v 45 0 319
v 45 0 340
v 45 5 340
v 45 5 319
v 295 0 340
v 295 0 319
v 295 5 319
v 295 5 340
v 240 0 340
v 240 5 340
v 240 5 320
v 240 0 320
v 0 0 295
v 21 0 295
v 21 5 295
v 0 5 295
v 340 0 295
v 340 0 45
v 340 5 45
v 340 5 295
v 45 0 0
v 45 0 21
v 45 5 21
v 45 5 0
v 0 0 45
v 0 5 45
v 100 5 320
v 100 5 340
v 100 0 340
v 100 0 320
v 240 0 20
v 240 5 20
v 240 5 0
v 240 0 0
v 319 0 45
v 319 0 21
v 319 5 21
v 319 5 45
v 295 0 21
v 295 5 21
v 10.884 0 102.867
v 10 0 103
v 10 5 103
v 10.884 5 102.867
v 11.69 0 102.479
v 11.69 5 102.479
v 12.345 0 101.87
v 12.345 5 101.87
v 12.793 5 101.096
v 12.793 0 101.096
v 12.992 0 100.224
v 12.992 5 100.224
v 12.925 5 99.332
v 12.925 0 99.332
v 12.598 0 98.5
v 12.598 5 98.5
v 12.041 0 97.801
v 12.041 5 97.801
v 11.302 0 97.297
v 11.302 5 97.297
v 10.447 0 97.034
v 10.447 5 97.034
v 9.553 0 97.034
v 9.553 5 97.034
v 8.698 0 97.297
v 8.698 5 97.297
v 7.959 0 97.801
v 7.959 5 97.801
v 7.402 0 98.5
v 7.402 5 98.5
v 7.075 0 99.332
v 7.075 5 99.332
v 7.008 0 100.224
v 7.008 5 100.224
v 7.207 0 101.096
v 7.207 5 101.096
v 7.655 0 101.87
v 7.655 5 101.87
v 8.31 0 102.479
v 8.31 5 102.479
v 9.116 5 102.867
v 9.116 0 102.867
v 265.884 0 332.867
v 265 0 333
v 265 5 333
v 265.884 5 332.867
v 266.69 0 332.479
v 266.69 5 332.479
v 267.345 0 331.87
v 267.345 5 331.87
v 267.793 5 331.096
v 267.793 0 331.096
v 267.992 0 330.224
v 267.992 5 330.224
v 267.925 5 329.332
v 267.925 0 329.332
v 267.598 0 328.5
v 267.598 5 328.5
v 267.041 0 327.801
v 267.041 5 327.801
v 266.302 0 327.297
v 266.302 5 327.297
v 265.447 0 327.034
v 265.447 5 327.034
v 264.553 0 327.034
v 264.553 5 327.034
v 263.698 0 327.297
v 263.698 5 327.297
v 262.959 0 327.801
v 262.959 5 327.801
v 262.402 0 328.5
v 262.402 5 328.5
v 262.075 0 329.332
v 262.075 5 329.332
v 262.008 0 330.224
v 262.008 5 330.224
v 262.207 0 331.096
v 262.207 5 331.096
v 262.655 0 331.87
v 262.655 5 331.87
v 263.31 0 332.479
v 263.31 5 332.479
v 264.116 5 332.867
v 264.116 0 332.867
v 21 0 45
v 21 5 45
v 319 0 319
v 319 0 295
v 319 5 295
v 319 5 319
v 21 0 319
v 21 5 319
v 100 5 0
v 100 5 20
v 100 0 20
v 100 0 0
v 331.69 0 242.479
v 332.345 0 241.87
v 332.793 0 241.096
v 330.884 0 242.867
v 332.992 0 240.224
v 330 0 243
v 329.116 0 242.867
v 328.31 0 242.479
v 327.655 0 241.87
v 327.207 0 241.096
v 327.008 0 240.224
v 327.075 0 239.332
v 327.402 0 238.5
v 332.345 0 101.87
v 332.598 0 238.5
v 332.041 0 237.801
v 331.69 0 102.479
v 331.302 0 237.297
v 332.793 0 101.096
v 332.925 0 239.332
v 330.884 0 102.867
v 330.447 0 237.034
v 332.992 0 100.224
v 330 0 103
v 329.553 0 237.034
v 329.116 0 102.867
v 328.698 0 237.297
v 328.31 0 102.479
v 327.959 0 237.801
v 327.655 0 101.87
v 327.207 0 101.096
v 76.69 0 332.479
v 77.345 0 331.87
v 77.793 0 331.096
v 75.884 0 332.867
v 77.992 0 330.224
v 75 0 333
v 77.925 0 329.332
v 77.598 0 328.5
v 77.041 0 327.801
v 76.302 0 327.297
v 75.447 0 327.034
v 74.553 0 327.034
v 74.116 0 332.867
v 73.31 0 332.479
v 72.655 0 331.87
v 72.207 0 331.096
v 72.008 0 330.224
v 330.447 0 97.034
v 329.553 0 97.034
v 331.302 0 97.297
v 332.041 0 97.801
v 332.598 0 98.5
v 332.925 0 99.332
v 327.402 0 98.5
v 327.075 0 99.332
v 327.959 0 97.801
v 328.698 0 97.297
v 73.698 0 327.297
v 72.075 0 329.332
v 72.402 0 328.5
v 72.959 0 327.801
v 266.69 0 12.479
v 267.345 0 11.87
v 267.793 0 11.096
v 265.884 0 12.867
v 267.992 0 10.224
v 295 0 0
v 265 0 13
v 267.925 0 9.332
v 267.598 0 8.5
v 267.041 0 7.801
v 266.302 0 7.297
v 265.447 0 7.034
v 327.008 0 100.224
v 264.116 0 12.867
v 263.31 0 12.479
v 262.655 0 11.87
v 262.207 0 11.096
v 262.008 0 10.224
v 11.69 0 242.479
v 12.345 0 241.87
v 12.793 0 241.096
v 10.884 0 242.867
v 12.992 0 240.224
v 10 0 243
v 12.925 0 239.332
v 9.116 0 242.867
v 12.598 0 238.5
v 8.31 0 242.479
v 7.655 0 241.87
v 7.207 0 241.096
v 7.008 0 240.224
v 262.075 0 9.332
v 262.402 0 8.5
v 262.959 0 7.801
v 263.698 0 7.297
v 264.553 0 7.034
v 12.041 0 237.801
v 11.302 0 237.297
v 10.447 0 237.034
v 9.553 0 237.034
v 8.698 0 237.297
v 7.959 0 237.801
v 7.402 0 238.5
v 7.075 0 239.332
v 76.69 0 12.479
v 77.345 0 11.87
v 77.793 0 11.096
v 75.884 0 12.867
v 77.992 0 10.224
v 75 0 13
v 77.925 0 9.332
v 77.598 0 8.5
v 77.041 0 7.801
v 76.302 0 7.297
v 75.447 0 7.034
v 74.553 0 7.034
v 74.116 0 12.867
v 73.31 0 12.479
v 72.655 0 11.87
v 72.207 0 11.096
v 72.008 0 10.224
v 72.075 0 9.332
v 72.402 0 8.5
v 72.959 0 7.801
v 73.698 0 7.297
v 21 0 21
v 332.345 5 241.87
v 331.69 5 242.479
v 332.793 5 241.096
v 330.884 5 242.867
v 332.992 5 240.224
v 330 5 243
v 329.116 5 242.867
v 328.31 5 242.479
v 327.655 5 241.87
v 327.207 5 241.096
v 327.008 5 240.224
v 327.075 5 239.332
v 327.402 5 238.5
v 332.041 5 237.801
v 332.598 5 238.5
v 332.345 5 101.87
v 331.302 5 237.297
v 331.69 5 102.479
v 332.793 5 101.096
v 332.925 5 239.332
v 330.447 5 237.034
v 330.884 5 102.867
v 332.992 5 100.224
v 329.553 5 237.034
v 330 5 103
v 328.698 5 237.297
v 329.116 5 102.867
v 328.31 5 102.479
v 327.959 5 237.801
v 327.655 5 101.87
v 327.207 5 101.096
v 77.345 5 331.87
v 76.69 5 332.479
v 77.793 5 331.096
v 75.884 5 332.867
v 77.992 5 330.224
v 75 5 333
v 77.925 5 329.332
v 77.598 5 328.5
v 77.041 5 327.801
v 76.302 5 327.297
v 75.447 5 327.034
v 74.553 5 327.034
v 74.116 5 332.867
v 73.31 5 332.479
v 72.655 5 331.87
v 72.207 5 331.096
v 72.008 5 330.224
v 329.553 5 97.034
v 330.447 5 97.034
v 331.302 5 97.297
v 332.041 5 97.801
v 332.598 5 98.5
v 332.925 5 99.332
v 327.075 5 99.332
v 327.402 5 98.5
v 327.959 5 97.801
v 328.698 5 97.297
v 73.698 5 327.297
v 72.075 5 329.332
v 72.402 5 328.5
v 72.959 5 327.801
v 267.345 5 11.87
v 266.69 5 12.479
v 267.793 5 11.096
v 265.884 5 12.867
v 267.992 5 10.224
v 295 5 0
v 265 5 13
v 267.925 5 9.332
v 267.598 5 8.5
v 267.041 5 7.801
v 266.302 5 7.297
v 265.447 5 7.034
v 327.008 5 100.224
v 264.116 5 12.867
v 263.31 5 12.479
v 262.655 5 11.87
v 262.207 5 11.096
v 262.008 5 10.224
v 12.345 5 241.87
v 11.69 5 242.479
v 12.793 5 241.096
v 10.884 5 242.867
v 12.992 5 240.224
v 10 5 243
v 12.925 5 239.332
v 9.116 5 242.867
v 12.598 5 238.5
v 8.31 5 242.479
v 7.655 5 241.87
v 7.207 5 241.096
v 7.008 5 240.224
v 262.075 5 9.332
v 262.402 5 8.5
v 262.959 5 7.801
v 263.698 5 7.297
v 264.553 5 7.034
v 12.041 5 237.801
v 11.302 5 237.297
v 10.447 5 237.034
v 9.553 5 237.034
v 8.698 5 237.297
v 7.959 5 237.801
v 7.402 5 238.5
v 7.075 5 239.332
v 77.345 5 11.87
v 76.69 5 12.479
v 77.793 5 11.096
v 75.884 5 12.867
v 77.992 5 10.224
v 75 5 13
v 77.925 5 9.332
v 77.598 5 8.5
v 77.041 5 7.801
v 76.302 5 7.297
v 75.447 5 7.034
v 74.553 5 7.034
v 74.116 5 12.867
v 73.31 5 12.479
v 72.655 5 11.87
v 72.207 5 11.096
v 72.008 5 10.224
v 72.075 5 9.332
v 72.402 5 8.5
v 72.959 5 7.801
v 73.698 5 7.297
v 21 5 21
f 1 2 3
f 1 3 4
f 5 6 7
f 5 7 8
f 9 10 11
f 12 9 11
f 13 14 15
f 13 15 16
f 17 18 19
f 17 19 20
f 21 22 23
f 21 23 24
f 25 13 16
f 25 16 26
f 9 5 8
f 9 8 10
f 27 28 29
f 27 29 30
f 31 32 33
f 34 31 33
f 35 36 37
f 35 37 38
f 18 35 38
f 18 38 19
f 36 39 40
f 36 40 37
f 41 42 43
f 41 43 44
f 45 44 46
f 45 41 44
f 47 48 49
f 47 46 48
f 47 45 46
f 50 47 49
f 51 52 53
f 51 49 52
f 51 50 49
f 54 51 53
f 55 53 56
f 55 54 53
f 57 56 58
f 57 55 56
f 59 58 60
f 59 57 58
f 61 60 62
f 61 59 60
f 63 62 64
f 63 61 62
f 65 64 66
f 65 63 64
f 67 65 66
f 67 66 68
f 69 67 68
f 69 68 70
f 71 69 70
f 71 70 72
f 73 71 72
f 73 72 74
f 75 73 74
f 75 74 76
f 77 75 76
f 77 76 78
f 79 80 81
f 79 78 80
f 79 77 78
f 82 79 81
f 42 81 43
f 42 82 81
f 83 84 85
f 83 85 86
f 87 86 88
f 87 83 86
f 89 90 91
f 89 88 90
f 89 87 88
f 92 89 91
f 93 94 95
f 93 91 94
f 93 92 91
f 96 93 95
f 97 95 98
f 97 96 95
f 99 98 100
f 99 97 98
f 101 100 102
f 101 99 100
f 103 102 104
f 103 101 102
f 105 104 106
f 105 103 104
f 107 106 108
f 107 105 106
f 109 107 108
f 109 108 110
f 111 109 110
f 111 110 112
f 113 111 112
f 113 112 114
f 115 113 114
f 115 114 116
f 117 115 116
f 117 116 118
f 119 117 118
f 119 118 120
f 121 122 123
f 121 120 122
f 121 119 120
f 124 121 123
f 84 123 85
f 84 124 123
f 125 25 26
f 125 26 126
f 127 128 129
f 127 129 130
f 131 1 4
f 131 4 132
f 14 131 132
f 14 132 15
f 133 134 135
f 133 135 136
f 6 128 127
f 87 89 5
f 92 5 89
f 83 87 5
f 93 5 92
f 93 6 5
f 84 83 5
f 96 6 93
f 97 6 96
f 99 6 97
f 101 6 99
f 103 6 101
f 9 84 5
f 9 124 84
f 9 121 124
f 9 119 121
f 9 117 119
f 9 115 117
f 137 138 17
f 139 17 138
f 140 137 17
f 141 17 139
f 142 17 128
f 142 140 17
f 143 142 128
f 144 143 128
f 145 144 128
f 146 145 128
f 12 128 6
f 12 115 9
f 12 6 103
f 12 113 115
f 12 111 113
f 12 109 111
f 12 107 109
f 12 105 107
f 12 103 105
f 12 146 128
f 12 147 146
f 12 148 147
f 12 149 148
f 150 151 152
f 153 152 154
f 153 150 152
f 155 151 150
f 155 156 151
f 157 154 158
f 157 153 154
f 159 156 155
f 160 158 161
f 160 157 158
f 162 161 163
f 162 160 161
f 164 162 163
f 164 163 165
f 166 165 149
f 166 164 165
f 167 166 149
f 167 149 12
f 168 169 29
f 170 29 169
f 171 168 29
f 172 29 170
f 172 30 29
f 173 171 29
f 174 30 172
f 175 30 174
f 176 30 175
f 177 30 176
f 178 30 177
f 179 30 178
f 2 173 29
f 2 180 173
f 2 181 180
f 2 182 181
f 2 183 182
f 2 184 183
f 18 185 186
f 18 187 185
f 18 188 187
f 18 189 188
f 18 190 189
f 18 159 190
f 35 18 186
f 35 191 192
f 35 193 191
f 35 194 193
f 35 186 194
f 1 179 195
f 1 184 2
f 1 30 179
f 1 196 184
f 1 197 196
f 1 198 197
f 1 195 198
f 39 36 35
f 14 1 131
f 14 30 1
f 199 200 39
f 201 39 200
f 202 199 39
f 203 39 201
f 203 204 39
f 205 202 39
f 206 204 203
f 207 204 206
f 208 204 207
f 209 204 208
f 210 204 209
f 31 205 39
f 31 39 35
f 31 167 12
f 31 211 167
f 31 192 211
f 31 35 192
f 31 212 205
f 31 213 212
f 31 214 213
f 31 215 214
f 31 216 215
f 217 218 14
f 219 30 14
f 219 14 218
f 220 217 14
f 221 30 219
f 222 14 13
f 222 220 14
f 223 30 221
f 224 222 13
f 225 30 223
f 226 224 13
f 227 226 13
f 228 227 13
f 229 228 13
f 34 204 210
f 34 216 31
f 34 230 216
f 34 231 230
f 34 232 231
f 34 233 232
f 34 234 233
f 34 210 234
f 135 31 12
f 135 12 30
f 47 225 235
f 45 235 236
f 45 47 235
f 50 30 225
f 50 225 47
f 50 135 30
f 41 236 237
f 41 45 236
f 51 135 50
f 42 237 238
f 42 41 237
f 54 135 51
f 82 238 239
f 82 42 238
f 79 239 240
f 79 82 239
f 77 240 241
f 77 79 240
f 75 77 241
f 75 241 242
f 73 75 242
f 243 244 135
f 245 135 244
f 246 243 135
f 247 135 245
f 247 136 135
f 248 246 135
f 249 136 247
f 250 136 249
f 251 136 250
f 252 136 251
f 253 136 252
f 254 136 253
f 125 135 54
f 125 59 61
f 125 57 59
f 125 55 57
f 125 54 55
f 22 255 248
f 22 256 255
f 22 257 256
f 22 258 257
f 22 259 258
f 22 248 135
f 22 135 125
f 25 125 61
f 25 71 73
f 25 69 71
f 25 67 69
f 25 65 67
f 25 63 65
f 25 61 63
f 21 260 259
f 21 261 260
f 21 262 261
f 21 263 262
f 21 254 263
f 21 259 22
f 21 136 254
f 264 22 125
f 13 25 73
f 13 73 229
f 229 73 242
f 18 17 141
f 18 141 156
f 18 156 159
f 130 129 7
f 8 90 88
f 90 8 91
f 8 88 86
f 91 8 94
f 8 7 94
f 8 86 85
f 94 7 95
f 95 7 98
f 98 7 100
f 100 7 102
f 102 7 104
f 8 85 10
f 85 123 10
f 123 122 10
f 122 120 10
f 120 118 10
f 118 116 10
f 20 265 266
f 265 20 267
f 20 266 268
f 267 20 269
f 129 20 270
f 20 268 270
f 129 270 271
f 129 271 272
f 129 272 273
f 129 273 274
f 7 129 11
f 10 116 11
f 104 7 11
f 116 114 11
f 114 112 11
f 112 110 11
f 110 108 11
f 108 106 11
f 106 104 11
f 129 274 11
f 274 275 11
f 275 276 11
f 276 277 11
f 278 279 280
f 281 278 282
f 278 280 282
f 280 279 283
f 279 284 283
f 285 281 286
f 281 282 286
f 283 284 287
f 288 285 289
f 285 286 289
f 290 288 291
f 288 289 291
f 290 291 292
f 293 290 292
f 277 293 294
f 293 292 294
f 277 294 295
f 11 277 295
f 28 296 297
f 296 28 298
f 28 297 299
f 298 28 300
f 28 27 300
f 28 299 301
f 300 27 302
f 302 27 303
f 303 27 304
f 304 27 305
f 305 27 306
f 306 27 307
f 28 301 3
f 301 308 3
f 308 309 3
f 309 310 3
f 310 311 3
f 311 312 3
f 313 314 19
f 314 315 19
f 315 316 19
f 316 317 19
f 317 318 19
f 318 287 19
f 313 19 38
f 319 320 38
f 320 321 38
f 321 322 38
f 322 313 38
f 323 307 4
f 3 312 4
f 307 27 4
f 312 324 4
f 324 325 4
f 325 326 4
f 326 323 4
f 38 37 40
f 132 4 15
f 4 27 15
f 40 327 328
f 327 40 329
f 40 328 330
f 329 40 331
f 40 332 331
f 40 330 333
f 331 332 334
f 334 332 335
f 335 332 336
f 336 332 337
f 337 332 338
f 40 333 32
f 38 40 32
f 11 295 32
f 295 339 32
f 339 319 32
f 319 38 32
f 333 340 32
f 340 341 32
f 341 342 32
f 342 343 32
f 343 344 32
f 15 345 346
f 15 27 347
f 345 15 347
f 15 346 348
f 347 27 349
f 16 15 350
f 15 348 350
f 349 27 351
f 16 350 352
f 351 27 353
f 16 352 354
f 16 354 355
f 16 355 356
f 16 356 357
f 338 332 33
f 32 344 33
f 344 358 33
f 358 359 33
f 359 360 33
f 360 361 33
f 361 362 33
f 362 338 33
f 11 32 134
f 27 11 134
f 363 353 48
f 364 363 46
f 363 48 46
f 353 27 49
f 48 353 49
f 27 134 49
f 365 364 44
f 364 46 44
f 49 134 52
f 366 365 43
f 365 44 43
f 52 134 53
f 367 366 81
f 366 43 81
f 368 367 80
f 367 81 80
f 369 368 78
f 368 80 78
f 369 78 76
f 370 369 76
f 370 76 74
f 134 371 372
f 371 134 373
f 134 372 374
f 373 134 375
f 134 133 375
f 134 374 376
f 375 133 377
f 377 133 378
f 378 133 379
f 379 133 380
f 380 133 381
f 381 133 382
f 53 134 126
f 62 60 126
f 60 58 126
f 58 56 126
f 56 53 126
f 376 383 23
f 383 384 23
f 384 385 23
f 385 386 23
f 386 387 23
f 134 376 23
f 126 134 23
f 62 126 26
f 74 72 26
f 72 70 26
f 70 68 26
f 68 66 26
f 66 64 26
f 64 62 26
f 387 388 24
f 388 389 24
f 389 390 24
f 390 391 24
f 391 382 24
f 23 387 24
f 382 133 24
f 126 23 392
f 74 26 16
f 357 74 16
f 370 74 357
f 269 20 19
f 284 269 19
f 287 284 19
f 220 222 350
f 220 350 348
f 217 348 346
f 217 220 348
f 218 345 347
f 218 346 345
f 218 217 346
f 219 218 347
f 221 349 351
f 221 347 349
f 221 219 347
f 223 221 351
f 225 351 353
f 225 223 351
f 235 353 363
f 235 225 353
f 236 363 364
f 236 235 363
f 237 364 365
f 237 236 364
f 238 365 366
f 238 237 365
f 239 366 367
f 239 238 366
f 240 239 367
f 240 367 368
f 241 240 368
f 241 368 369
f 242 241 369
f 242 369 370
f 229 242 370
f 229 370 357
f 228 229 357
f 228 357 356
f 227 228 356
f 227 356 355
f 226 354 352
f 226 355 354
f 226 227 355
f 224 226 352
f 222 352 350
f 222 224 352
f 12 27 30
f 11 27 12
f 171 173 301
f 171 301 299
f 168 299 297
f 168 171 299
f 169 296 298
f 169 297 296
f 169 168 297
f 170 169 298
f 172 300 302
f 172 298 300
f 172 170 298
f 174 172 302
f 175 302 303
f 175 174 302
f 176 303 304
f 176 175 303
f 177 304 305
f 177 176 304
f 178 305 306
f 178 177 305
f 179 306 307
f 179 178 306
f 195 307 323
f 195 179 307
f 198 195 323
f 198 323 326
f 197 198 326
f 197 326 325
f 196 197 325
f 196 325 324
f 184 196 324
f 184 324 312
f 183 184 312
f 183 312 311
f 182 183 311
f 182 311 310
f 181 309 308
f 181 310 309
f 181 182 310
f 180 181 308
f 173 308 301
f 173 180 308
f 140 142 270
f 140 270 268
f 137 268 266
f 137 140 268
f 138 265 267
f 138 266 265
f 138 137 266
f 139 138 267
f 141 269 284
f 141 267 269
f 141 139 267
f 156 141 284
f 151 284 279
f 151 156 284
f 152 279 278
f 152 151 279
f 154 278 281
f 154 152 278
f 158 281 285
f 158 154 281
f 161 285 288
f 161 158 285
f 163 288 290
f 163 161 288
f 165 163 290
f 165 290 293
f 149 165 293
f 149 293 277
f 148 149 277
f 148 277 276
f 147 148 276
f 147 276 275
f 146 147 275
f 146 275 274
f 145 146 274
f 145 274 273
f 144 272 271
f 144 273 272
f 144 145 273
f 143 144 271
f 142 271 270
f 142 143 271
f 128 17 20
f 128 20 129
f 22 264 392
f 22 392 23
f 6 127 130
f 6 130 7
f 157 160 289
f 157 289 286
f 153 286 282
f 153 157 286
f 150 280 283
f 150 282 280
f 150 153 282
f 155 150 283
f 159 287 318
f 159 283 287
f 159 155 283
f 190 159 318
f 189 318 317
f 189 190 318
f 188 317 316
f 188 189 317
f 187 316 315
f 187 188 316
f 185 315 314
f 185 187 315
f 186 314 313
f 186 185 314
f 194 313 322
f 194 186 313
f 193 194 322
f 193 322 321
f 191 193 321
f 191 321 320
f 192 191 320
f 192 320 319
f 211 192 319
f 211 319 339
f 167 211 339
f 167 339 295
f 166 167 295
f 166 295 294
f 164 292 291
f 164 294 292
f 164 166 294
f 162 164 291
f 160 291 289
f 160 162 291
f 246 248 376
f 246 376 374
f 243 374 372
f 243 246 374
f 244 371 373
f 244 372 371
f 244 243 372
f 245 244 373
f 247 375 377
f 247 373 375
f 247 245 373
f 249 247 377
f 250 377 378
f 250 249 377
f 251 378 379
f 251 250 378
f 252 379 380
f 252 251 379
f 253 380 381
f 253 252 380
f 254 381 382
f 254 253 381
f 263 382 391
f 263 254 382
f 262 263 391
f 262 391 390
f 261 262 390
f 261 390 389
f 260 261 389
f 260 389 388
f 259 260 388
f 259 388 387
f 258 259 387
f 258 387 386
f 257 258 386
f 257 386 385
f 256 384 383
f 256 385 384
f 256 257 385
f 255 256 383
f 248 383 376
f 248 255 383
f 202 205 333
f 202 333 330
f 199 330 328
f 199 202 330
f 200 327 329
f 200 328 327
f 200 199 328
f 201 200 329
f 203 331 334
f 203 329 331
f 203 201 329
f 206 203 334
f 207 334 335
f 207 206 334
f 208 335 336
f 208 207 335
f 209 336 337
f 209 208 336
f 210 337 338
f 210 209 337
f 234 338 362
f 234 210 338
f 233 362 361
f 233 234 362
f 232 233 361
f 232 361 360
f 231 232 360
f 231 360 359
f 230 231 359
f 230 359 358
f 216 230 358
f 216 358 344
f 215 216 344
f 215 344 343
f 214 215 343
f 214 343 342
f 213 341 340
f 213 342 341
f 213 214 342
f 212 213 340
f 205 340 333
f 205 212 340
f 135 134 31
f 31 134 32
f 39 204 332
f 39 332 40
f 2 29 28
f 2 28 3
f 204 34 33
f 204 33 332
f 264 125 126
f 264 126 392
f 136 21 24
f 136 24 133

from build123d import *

# Parameters (mm, degrees)
BOSS_EXTRUDE1_DEPTH     = 5
CUT_EXTRUDE1_DEPTH      = 57
CUT_EXTRUDE1_DEPTH_BACK = 57
SKETCH2_R               = 3
SKETCH3_W               = 140
SKETCH3_H               = 20
CUT_EXTRUDE2_DEPTH      = 10


with BuildPart() as part:
    # Sketch1 → Boss-Extrude1 (new body)
    with BuildSketch(Plane(origin=(0, 0, 0), x_dir=(1, 0, 0), z_dir=(0, 1, 0))):
        Polygon((0, -45), (21, -45), (21, -21), (45, -21), (45, 0), (295, 0), (295, -21), (319, -21), (319, -45), (340, -45), (340, -295), (319, -295), (319, -319), (295, -319), (295, -340), (45, -340), (45, -319), (21, -319), (21, -295), (0, -295), align=None)
    extrude(amount=BOSS_EXTRUDE1_DEPTH)

    # Sketch2 → Cut-Extrude1 (cut, two sides: drawn at the far end of the back side and taken through both)
    with BuildSketch(Plane(origin=(0, 5, 0), x_dir=(1, 0, 0), z_dir=(0, 1, 0)).offset(-CUT_EXTRUDE1_DEPTH_BACK)):
        with Locations((75, -10)):
            Circle(SKETCH2_R)
        with Locations((265, -10)):
            Circle(SKETCH2_R)
        with Locations((265, -330)):
            Circle(SKETCH2_R)
        with Locations((75, -330)):
            Circle(SKETCH2_R)
        with Locations((10, -240)):
            Circle(SKETCH2_R)
        with Locations((10, -100)):
            Circle(SKETCH2_R)
        with Locations((330, -240)):
            Circle(SKETCH2_R)
        with Locations((330, -100)):
            Circle(SKETCH2_R)
    extrude(amount=CUT_EXTRUDE1_DEPTH + CUT_EXTRUDE1_DEPTH_BACK, mode=Mode.SUBTRACT)

    # Sketch3 → Cut-Extrude2 (cut)
    with BuildSketch(Plane(origin=(0, 5, 0), x_dir=(1, 0, 0), z_dir=(0, 1, 0))):
        with Locations((170, -10)):
            Rectangle(SKETCH3_W, SKETCH3_H)
        with Locations((170, -330)):
            Rectangle(SKETCH3_W, SKETCH3_H)
    extrude(amount=-CUT_EXTRUDE2_DEPTH, mode=Mode.SUBTRACT)


solid = part.part
